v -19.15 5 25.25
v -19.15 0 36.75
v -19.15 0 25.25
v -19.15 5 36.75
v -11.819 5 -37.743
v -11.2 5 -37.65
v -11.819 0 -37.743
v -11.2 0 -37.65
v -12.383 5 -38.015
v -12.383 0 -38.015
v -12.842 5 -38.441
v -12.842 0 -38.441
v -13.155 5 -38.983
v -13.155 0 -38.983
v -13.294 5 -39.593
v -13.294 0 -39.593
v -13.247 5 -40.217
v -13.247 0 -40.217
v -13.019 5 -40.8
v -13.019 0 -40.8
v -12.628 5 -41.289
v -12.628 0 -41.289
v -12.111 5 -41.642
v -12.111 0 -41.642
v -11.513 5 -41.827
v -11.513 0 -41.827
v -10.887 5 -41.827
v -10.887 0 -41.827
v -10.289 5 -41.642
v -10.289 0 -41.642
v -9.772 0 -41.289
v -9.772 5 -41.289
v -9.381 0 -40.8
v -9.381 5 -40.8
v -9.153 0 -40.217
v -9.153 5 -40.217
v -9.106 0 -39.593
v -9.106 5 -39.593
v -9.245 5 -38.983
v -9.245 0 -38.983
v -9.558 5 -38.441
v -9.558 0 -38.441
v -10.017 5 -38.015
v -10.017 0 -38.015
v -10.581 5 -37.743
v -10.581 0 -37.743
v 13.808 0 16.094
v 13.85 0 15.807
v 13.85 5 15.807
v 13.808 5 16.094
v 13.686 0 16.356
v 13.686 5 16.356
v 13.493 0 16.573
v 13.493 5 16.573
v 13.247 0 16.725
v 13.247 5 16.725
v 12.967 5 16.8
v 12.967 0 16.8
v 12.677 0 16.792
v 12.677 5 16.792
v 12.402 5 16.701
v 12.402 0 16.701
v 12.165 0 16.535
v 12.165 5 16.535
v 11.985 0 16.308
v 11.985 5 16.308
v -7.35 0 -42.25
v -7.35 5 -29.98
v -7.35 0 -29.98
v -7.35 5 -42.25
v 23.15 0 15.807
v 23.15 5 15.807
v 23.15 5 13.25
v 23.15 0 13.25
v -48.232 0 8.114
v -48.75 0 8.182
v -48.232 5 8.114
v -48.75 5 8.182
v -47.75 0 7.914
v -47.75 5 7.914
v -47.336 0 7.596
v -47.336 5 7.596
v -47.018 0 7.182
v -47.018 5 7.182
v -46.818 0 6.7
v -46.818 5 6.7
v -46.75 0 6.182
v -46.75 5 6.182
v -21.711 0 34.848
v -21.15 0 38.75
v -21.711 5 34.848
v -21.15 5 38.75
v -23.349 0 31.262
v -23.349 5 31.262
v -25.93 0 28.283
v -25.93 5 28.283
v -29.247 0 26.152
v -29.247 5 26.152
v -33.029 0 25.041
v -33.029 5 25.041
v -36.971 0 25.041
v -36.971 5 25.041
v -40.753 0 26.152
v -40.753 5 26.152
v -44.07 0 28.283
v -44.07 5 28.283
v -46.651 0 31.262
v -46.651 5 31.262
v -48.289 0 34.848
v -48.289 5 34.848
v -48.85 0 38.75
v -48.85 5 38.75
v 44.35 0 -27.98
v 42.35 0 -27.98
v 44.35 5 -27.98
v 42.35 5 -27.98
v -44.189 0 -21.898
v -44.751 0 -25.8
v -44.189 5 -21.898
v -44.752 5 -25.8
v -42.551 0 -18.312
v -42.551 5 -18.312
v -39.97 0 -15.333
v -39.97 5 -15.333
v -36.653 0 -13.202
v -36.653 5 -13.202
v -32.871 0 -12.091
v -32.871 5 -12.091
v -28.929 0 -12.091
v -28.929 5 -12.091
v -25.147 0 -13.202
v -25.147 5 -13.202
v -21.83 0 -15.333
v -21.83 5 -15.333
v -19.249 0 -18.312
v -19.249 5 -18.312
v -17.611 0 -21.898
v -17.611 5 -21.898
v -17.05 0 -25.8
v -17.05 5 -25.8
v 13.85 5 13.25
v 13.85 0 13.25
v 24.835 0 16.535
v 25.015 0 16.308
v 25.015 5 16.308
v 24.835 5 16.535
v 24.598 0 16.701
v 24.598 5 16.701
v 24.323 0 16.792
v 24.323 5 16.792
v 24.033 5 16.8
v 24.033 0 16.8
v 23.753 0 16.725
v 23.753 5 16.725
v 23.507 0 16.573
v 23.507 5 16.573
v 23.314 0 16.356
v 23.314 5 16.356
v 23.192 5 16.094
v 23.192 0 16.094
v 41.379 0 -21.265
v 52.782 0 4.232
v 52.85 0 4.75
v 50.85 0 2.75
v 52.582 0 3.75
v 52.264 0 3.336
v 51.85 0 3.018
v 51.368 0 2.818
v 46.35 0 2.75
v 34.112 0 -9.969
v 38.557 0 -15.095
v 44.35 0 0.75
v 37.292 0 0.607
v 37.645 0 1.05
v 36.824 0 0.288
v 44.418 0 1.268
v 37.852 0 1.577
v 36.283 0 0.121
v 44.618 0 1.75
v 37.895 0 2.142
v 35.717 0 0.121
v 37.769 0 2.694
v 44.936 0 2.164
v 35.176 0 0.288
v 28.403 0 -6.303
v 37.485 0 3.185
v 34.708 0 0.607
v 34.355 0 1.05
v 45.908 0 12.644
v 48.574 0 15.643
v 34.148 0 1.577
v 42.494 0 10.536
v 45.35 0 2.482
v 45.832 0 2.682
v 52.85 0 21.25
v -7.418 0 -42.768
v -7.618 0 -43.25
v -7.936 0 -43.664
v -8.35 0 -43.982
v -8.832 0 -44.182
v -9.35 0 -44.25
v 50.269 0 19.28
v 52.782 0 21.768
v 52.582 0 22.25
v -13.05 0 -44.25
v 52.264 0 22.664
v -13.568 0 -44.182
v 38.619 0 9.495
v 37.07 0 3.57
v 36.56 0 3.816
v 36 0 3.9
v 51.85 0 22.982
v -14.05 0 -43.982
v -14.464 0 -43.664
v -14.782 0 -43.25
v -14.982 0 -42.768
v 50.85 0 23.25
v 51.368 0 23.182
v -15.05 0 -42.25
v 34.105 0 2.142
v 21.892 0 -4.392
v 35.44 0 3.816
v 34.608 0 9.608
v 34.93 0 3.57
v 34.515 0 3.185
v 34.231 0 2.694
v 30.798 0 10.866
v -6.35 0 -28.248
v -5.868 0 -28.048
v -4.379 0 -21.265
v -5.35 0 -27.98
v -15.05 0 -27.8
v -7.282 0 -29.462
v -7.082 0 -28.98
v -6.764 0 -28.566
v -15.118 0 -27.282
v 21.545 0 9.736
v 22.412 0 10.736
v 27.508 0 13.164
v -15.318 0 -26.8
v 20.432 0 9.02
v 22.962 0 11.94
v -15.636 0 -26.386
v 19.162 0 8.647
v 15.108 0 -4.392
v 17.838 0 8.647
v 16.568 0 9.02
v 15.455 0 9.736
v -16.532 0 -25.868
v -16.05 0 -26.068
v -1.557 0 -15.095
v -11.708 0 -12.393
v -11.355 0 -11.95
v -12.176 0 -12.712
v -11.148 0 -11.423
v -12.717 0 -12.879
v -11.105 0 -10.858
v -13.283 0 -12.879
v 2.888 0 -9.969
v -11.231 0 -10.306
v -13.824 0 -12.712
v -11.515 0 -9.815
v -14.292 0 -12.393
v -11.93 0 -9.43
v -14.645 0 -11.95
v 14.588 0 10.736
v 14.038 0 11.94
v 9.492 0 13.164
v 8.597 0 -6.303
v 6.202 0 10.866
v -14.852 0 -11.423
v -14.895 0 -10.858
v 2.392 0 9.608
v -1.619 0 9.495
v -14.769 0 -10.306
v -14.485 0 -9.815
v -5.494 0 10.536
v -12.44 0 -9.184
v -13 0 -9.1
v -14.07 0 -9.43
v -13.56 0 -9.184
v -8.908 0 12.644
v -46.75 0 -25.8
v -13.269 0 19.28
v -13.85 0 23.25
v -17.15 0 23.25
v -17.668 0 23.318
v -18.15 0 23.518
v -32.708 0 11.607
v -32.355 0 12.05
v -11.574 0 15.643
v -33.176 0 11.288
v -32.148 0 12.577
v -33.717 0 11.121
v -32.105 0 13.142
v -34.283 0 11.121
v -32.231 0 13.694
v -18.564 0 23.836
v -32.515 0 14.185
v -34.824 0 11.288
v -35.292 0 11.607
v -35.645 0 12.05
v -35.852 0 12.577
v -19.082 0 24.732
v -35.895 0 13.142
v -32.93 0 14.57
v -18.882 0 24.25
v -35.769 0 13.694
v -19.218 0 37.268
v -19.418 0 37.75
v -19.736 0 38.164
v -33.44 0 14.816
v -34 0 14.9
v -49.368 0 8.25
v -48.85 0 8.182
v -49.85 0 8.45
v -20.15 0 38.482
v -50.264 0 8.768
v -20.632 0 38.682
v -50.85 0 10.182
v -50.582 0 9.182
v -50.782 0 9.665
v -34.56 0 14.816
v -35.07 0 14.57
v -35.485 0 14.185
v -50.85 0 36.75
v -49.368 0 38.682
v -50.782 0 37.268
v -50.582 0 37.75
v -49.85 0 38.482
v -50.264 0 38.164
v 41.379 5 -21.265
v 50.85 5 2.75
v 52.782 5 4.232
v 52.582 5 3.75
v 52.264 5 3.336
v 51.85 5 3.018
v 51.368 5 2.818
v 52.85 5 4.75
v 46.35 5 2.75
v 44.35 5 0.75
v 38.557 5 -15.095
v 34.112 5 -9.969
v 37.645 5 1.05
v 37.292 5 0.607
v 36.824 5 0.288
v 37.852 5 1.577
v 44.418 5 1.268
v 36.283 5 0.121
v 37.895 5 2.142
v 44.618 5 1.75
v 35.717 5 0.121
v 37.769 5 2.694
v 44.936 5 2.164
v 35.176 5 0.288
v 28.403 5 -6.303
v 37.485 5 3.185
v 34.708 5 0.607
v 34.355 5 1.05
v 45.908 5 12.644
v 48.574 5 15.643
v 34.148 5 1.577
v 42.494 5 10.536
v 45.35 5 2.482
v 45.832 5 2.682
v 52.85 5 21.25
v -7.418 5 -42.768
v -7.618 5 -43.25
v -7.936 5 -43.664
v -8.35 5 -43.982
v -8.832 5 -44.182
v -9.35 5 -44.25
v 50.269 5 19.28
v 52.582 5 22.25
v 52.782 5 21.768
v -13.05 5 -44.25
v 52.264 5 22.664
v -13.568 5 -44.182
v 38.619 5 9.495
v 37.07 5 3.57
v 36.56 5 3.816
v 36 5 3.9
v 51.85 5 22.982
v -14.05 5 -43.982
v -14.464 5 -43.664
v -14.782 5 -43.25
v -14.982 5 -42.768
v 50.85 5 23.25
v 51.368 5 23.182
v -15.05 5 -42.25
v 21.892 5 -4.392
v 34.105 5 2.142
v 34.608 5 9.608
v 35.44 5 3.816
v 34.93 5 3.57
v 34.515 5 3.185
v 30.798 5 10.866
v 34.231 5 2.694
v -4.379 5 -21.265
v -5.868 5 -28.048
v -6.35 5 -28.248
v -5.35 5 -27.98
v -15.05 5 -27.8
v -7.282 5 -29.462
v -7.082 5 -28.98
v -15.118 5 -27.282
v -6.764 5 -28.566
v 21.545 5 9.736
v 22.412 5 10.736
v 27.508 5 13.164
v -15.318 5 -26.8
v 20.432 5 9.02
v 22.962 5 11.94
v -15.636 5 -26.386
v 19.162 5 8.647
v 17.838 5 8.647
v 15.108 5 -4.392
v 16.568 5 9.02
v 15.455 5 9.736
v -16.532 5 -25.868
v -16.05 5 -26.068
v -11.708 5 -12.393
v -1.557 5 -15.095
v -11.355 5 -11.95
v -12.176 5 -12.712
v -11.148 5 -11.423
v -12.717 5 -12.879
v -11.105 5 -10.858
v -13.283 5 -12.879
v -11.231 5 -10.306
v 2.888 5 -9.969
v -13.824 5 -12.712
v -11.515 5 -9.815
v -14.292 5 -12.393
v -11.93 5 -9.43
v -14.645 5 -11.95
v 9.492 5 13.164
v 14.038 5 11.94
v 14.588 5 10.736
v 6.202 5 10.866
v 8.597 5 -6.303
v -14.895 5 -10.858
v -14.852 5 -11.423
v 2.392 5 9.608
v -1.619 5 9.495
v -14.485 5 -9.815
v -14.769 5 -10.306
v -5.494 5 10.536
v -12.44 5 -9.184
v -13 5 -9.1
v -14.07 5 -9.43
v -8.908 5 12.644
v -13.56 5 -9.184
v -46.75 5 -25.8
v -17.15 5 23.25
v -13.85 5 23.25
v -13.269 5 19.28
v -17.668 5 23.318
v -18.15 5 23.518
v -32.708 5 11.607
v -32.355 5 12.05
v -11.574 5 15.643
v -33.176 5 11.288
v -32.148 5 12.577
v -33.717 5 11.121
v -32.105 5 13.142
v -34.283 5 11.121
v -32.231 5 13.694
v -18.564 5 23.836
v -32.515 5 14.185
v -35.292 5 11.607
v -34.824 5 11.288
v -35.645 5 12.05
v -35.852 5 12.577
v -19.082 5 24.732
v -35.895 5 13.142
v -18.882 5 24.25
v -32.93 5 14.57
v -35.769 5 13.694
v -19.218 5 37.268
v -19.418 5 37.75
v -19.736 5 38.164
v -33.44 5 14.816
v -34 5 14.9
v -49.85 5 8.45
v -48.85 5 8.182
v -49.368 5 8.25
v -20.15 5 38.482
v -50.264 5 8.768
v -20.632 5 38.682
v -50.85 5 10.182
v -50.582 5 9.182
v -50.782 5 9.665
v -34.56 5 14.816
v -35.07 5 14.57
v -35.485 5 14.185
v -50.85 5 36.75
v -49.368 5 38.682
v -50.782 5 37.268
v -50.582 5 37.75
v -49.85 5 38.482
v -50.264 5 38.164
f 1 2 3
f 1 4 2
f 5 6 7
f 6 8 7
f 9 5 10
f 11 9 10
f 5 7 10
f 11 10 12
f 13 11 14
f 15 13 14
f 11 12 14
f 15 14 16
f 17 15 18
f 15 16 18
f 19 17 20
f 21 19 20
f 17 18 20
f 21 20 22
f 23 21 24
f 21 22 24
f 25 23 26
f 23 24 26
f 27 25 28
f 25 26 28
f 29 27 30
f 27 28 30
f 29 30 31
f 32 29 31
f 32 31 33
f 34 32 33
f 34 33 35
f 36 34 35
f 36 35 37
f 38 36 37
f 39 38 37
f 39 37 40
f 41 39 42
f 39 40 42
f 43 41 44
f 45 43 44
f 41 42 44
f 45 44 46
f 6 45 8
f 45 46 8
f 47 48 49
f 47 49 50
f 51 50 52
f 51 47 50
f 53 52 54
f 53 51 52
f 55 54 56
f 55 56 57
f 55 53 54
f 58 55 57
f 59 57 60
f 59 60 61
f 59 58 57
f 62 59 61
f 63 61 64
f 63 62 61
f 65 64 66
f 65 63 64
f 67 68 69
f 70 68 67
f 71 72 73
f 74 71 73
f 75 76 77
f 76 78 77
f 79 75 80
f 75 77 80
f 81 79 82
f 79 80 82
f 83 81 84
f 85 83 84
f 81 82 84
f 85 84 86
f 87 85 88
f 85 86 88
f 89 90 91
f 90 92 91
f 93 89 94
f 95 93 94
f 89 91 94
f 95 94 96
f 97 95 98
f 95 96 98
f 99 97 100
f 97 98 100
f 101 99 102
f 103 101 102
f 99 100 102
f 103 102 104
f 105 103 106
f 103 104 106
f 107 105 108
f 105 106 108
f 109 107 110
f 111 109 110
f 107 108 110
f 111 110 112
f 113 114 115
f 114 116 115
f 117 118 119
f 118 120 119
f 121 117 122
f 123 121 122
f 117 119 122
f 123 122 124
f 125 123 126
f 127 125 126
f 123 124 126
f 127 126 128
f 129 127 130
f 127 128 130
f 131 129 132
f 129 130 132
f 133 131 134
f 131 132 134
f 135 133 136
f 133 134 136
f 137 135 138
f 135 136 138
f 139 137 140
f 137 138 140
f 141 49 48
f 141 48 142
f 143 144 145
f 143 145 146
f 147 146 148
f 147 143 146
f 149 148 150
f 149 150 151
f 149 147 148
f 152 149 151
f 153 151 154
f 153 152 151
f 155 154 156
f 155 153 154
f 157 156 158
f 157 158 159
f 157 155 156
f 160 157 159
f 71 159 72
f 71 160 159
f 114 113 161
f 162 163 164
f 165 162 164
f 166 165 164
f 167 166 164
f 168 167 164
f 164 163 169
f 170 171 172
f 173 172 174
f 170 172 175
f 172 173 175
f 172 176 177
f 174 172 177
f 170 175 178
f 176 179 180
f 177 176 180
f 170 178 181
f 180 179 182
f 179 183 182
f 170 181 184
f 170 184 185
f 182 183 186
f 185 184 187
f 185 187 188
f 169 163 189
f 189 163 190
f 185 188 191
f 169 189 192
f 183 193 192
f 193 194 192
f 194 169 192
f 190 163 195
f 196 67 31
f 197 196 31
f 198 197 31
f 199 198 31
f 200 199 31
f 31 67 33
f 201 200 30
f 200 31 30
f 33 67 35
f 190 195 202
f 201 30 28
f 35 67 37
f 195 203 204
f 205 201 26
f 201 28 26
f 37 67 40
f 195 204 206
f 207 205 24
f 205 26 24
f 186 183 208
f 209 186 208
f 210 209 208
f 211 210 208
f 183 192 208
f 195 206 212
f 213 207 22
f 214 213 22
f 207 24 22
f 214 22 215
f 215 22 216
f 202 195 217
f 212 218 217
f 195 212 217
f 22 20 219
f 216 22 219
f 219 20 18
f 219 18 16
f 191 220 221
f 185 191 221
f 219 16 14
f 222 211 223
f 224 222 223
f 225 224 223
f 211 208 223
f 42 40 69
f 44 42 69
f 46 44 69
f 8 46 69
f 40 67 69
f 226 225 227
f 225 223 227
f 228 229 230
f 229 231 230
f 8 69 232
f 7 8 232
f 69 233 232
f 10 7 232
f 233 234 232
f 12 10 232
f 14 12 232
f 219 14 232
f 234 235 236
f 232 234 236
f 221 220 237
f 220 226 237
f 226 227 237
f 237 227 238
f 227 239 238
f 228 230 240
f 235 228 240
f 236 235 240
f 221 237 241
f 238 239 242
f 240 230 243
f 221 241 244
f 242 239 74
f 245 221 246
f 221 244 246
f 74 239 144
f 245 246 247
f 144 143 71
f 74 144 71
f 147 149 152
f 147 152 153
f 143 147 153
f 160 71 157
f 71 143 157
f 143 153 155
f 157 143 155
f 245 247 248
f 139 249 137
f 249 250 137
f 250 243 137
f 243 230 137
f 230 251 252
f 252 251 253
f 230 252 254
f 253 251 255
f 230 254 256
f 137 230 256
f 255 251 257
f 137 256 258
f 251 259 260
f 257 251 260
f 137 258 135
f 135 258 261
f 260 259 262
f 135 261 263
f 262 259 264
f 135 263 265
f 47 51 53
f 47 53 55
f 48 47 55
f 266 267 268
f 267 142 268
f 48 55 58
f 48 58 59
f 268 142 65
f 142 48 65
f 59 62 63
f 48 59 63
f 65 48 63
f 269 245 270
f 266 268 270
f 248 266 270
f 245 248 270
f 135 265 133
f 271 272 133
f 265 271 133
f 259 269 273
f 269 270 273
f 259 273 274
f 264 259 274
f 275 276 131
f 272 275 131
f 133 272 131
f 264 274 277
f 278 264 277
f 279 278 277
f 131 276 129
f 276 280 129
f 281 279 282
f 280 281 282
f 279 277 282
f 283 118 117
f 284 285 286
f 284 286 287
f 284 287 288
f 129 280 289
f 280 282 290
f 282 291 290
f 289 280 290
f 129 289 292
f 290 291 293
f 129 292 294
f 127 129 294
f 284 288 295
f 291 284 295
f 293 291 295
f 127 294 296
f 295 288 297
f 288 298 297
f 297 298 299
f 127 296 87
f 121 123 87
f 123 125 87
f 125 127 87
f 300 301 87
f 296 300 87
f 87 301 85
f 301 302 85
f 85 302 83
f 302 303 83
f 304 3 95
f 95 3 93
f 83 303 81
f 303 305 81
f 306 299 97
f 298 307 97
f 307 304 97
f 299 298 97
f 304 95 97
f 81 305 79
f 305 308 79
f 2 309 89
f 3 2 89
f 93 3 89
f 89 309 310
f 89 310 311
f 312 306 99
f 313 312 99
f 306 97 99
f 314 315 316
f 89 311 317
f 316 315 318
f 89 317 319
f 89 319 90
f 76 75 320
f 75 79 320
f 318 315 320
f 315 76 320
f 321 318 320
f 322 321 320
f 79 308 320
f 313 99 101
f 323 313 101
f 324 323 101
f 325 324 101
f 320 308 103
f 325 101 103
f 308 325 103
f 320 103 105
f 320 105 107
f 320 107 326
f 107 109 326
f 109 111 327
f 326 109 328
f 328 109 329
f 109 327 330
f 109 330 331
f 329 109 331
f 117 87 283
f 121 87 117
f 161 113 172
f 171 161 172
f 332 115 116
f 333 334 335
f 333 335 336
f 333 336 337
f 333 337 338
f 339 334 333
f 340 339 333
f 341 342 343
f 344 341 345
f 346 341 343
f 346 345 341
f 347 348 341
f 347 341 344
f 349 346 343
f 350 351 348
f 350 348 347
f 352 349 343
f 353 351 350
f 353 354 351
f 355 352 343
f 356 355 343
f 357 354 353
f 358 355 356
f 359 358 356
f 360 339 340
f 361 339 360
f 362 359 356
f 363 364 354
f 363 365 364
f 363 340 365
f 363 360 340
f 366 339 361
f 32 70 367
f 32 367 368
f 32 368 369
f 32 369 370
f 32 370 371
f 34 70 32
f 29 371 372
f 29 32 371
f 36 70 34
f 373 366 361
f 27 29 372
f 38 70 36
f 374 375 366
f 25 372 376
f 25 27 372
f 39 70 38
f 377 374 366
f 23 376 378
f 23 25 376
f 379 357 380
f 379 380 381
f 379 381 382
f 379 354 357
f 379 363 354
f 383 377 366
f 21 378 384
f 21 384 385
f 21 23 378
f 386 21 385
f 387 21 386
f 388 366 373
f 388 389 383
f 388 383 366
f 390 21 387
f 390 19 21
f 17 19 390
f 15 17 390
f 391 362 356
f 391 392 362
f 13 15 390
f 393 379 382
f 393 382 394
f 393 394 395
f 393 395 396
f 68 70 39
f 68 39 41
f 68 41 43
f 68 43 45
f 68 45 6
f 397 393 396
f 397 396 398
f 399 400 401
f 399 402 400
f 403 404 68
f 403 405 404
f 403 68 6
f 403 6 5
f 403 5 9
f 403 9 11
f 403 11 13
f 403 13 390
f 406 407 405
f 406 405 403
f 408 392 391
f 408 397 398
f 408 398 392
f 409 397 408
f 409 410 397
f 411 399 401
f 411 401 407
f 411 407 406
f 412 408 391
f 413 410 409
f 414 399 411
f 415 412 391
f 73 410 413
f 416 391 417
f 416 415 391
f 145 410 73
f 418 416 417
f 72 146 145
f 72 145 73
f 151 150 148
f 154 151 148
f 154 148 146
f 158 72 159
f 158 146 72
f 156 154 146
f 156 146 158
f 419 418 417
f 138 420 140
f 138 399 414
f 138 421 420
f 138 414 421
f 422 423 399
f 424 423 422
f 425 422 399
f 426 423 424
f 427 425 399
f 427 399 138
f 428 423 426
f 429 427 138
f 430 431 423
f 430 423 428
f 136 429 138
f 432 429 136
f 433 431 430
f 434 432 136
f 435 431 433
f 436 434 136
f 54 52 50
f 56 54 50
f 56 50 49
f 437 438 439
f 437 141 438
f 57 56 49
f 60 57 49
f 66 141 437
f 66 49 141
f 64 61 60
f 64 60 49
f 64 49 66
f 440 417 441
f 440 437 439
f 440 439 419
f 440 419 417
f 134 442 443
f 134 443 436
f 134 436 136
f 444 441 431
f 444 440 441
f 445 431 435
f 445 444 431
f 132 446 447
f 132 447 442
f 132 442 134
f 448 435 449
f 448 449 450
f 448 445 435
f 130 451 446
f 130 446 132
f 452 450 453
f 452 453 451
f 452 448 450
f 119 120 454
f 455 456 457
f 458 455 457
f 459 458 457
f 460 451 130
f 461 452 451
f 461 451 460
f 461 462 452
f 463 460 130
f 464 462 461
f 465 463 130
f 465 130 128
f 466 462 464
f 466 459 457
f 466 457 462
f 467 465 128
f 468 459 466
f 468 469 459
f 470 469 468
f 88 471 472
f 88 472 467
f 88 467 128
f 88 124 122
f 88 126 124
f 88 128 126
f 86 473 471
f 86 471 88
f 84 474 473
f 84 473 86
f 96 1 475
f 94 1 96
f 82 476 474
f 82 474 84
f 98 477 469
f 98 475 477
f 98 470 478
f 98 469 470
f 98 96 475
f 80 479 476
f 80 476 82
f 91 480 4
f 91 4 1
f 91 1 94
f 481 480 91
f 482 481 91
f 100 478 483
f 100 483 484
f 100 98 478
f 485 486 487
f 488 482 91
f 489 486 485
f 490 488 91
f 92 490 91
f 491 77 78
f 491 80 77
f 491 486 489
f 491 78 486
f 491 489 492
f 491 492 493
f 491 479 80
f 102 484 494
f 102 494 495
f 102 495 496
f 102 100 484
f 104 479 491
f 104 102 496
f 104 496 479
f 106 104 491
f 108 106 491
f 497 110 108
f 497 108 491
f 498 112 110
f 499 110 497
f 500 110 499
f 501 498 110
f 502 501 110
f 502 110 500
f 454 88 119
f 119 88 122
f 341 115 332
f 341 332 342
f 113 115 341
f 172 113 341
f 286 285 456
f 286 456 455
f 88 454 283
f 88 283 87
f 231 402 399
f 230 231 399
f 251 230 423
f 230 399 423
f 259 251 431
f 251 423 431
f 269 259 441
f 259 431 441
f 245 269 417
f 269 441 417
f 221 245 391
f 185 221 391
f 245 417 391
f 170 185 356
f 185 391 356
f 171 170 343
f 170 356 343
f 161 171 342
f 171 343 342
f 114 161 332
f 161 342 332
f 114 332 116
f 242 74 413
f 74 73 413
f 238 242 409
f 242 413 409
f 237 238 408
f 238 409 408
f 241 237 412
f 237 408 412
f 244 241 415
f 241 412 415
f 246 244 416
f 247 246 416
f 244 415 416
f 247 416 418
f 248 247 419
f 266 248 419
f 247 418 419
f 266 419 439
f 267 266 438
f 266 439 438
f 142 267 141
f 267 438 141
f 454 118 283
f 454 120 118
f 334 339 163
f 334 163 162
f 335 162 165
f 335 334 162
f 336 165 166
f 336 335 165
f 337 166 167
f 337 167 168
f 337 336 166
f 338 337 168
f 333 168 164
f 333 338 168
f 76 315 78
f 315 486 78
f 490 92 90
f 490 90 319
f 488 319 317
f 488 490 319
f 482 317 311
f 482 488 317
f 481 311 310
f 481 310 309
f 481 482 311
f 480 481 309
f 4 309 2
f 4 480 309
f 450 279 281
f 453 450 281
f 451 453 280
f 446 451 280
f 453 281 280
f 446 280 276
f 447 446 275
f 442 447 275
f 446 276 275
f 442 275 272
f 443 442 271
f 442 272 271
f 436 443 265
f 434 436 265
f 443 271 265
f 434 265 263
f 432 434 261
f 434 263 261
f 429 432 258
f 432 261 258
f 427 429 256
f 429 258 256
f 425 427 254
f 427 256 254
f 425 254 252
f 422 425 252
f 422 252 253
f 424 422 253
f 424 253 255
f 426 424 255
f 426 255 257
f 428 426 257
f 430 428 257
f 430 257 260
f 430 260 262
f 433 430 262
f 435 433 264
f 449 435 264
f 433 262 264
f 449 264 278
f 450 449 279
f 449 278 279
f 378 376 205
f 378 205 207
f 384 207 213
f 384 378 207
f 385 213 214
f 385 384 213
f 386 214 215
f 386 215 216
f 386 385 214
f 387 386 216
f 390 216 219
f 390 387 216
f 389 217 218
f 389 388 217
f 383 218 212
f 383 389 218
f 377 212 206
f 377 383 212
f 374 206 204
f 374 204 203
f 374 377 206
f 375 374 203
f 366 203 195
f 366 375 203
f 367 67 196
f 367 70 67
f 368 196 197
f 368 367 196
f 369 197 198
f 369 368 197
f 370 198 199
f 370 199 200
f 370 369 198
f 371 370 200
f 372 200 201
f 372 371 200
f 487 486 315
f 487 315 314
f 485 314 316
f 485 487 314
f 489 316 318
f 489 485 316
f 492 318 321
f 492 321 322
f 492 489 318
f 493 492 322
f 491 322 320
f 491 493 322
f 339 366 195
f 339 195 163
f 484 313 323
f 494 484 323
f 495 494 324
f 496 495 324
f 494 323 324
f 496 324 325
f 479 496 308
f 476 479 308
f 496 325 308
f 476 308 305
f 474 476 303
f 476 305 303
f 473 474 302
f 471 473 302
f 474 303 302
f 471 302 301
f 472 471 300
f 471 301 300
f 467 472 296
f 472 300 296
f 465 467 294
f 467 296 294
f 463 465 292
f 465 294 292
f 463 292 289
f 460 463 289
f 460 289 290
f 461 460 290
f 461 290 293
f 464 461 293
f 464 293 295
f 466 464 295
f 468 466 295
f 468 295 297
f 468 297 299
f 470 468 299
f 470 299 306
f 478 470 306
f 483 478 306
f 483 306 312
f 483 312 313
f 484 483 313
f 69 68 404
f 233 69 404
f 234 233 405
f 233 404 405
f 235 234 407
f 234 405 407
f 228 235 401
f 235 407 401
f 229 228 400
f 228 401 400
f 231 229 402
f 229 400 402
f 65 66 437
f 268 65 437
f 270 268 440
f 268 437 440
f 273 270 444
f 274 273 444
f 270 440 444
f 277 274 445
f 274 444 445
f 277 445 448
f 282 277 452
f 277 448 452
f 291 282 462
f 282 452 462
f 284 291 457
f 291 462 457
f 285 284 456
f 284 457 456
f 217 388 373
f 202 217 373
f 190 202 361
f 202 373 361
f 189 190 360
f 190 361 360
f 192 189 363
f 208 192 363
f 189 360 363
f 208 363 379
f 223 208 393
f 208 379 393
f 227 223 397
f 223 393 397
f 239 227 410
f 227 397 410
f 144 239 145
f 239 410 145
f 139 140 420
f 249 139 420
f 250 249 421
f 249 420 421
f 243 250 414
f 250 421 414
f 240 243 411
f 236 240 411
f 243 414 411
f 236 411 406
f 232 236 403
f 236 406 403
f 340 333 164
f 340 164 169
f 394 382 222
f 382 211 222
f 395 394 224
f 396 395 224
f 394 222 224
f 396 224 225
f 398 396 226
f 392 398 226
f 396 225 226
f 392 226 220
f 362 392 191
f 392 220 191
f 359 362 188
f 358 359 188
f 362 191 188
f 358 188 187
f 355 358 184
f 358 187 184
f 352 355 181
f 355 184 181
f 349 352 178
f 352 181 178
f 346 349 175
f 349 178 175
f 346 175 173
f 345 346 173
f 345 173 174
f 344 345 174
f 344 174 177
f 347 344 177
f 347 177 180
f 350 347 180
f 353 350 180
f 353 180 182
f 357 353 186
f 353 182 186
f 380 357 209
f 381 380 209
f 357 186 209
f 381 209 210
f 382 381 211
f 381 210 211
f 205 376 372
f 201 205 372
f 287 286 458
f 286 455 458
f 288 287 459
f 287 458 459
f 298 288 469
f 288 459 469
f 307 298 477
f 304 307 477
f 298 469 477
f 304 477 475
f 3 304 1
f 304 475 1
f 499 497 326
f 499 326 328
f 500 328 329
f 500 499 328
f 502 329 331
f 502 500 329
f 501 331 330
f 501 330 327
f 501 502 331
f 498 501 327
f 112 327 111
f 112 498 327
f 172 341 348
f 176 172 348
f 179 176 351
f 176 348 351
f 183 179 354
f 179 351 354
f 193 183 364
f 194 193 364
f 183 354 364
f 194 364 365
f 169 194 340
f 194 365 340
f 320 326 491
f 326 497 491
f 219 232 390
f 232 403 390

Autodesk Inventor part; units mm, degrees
ref_plane "YZ Plane" through (0, 0, 0) normal (1, 0, 0) x (0, 1, 0)
ref_plane "XZ Plane" through (0, 0, 0) normal (0, 1, 0) x (-1, 0, 0)
ref_plane "XY Plane" through (0, 0, 0) normal (0, 0, 1) x (1, 0, 0)
sketch "Sketch1" plane through (0, 0, 0) normal (0, 1, 0) x (-1, 0, 0)
  line L0 (-56.25, 58.25) -> (56.25, 58.25)
  line L1 (56.25, 58.25) -> (56.25, -58.25)
  line L2 (56.25, -58.25) -> (-56.25, -58.25)
  line L3 (-56.25, -58.25) -> (-56.25, 58.25)
  line L4 (-56.25, 58.25) -> (56.25, -58.25) construction
  line L5 (56.25, 58.25) -> (-56.25, -58.25) construction
  point P0 (0, 0)
  dimension "d0" = 112.5
  dimension "d1" = 116.5
extrude "Extrusion1" add sketch "Sketch1" along normal blind 5
sketch "Sketch2" plane through (0, 5, 0) normal (0, 1, 0) x (1, 0, 0)
  circle A0 centre (18.5, 28) radius 23.85
  circle A1 centre (37, -23.25) radius 13.85
  circle A2 centre (-35, -38.75) radius 13.85
  circle A3 centre (-30.9, 25.8) radius 13.85
  circle A4 centre (0, -23.25) radius 13.85
  line L0 (56.25, 58.25) -> (-56.25, 58.25) projected
  line L1 (-56.25, -58.25) -> (56.25, -58.25) projected
  line L2 (0, -105.9299) -> (0, 123.2086) construction
  line L3 (-76.4777, -38.75) -> (-5.35, -38.75) construction
  line L4 (-123.5447, -23.25) -> (82.5572, -23.25) construction
  line L5 (56.25, -58.25) -> (56.25, 58.25) construction
  point P0 (0, 0)
  dimension "d4" = 47.7
  dimension "d5" = 27.7
  dimension "d6" = 27.7
  dimension "d7" = 27.7
  dimension "d8" = 27.7
  dimension "d9" = 116.5
  dimension "d10" = 112.5
  dimension "d13" = 37
  dimension "d14" = 18.5
  dimension "d15" = 30.9
  dimension "d18" = 19.5
  dimension "d19" = 35
  dimension "d20" = 35
  dimension "d42" = 25.8
  dimension "d43" = 28
extrude "Extrusion2" cut sketch "Sketch2" against normal blind 5
sketch "Sketch5" plane through (0, 5, 0) normal (0, 1, 0) x (1, 0, 0)
  line L0 (-56.25, 58.25) -> (-56.25, -58.25) construction
  circle A0 centre (0, -23.25) radius 13.85 construction
  circle A1 centre (37, -23.25) radius 13.85 construction
  circle A2 centre (-30.9, 25.8) radius 13.85 construction
  line L1 (56.25, 58.25) -> (-56.25, 58.25) construction
  line L2 (-17.15, -23.25) -> (-13.85, -23.25) construction
  line L3 (-46.75, -8.1822) -> (-46.85, -8.1822)
  line L4 (-13.85, -23.25) -> (-17.15, -23.25)
  line L5 (56.25, -58.25) -> (56.25, 58.25)
  line L6 (-46.85, -8.1822) -> (-46.75, -8.1822)
  arc A3 (-13.85, -23.25) -> (13.85, -23.25) centre (0, -23.25) ccw
  arc A4 (23.15, -23.25) -> (50.85, -23.25) centre (37, -23.25) ccw
  line L7 (-44.75, 58.25) -> (42.35, 58.25)
  line L8 (-48.85, -38.75) -> (-48.85, -38.75)
  line L9 (-50.85, -36.75) -> (-50.85, -10.1822)
  line L10 (-48.85, -8.1822) -> (-48.75, -8.1822)
  arc A5 (-50.85, -36.75) -> (-48.85, -38.75) centre (-48.85, -36.75) ccw
  arc A6 (-48.85, -8.1822) -> (-50.85, -10.1822) centre (-48.85, -10.1822) ccw
  line L11 (50.85, -23.25) -> (50.85, -23.25)
  line L12 (52.85, -21.25) -> (52.85, -4.75)
  line L13 (50.85, -2.75) -> (46.35, -2.75)
  arc A7 (50.85, -23.25) -> (52.85, -21.25) centre (50.85, -21.25) ccw
  arc A8 (52.85, -4.75) -> (50.85, -2.75) centre (50.85, -4.75) ccw
  line L14 (-44.7516, 25.8) -> (-44.7516, 25.8)
  line L15 (-46.75, 28.0339) -> (-46.75, 58.25)
  line L16 (-44.75, 58.25) -> (-46.75, 58.25)
  line L17 (-17.0566, 26.2282) -> (-17.0566, 26.2282)
  line L18 (-15.05, 27.8) -> (-15.05, 42.25)
  line L19 (-5.35, 27.98) -> (-5.35, 27.98)
  line L20 (-7.35, 30.25) -> (-7.35, 42.25)
  line L21 (42.35, 27.98) -> (42.35, 27.98)
  line L22 (44.35, 58.25) -> (42.35, 58.25)
  circle A9 centre (0, -23.25) radius 13.85
  circle A10 centre (37, -23.25) radius 13.85
  line L23 (44.35, 58.25) -> (44.35, -0.75)
  line L24 (42.35, 27.98) -> (44.35, 27.98)
  line L25 (-5.35, 27.98) -> (-5.35, 27.98)
  line L26 (-7.35, 29.98) -> (-7.35, 30.25)
  line L27 (-17.0566, 26.2282) -> (-17.0566, 26.2282)
  line L28 (-15.05, 28.0029) -> (-15.05, 28.0029)
  line L29 (-46.75, 28.0339) -> (-46.75, -6.1822)
  arc A11 (-48.75, -8.1822) -> (-46.75, -6.1822) centre (-48.75, -6.1822) ccw
  line L30 (-44.75, 25.8) -> (-46.75, 25.8)
  line L31 (-21.15, -38.75) -> (-21.15, -38.75)
  line L32 (-19.15, -36.75) -> (-19.15, -25.25)
  arc A12 (-21.15, -38.75) -> (-19.15, -36.75) centre (-21.15, -36.75) ccw
  arc A13 (-17.15, -23.25) -> (-19.15, -25.25) centre (-17.15, -25.25) ccw
  line L33 (-17.05, 25.8) -> (-17.05, 25.8)
  arc A14 (-17.05, 25.8) -> (-15.05, 27.8) centre (-17.05, 27.8) ccw
  line L34 (-56.25, -58.25) -> (56.25, -58.25)
  line L35 (56.25, -58.25) -> (56.25, 58.25)
  line L36 (56.25, 58.25) -> (-56.25, 58.25)
  line L37 (-56.25, 58.25) -> (-56.25, -58.25)
  circle A15 centre (-30.9, 25.8) radius 13.85 projected
  circle A16 centre (-30.9, 25.8) radius 13.85
  line L38 (13.85, -23.25) -> (13.85, -13.25)
  circle A17 centre (0, -23.25) radius 13.85 projected
  line L39 (23.15, -23.25) -> (23.15, -13.25)
  circle A18 centre (37, -23.25) radius 13.85 projected
  arc A19 (23.15, -13.25) -> (13.85, -13.25) centre (18.5, -13.25) ccw
  circle A20 centre (18.5, 28) radius 23.85
  circle A21 centre (18.5, 28) radius 23.85 projected
  line L40 (56.25, 58.25) -> (-56.25, 58.25) projected
  circle A22 centre (-35, -38.75) radius 13.85
  circle A23 centre (-35, -38.75) radius 13.85 projected
  arc A24 (44.35, -0.75) -> (46.35, -2.75) centre (46.35, -0.75) ccw
  line L41 (-5.35, 27.98) -> (-5.35, 27.98)
  arc A25 (-7.35, 29.98) -> (-5.35, 27.98) centre (-5.35, 29.98) ccw
  line L42 (-13.05, 44.25) -> (-9.35, 44.25)
  arc A26 (-13.05, 44.25) -> (-15.05, 42.25) centre (-13.05, 42.25) ccw
  arc A27 (-7.35, 42.25) -> (-9.35, 44.25) centre (-9.35, 42.25) ccw
  point P0 (0, 0)
  point P1 (0, 0)
  point P2 (44.35, -2.75)
  point P3 (-50.85, -38.75)
  point P4 (52.85, -23.25)
  point P5 (-15.05, 58.25)
  point P6 (-7.35, 58.25)
  point P7 (-48.85, -40.25)
  point P8 (50.85, -23.25)
  point P9 (-21.15, -40.25)
  point P10 (50.85, -23.25)
  point P11 (-7.35, 58.25)
  point P12 (50.85, -23.25)
  point P13 (-17.05, 25.8)
  point P14 (-7.35, 27.98)
  point P15 (-7.35, 29.98)
  point P16 (-21.15, -38.75)
  point P17 (-48.85, -38.75)
  dimension "d53" = 27.7
  dimension "d54" = 27.7
  dimension "d26" = 2
  dimension "d27" = 2
  dimension "d28" = 2
  dimension "d29" = 2
  dimension "d30" = 2
  dimension "d32" = 2
  dimension "d33" = 2
  dimension "d34" = 2
  dimension "d35" = 2
  dimension "d38" = 27.7
  dimension "d39" = 10
  dimension "d40" = 10
  dimension "d45" = 25.8
  dimension "d46" = 23.25
  dimension "d47" = 23.25
  dimension "d50" = 37
  dimension "d56" = 19.15
  dimension "d57" = 50.85
  dimension "d58" = 46.75
  dimension "d59" = 2
  dimension "d60" = 6.1822
  dimension "d61" = 31.7
  dimension "d63" = 30.9
  dimension "d64" = 3.4
  dimension "d65" = 11.9
  dimension "d66" = 61
  dimension "d67" = 47.7
  dimension "d68" = 28
  dimension "d69" = 18.5
  dimension "d71" = 30.27
  dimension "d72" = 27.7
  dimension "d73" = 2
  dimension "d74" = 30.27
  dimension "d75" = 2
  dimension "d76" = 112.5
  dimension "d77" = 116.5
  dimension "d79" = 14
  dimension "d80" = 2
  dimension "d81" = 51.7
  dimension "d82" = 2
extrude "Extrusion3" cut sketch "Sketch5" against normal blind 10 contours A3 L38 A19 L39 A4 A7 L12 A8 L13 A24 L23 L36 L5 L34 L37 L15 L29 A11 L10 A6 L9 A5 A22 A12 L32 A13 L4 | L29 L15 L16 L7 L22 L23 L24 A20 A25 L26 L20 A27 L42 A26 L18 A14 A15 L30
fillet "Fillet2" radius 1 2 edges at (13.85, 2.5, 23.25) (23.15, 2.5, 23.25)
sketch "Sketch7" plane through (0, 5, 0) normal (0, 1, 0) x (1, 0, 0)
  line L0 (-7.35, 29.98) -> (-7.35, 42.25) projected
  line L1 (-9.35, 44.25) -> (-13.05, 44.25) projected
  point P0 (0, 0)
  point P1 (-34, -13)
  point P2 (-13, 11)
  point P3 (36, -2)
  point P4 (-11.2, 39.75)
  dimension "d83" = 13
  dimension "d84" = 34
  dimension "d85" = 36
  dimension "d86" = 2
  dimension "d87" = 11
  dimension "d88" = 13
  dimension "d96" = 3.85
  dimension "d97" = 4.5
hole "Hole1" at (-34, 5, 13) at (-13, 5, -11) at (36, 5, 2) direction (0, -1, 0) diameter 3.8 end through all
hole "Hole2" at (-11.2, 5, -39.75) direction (0, -1, 0) diameter 4.2 end through all
properties part number "Bottle layout pt2"
